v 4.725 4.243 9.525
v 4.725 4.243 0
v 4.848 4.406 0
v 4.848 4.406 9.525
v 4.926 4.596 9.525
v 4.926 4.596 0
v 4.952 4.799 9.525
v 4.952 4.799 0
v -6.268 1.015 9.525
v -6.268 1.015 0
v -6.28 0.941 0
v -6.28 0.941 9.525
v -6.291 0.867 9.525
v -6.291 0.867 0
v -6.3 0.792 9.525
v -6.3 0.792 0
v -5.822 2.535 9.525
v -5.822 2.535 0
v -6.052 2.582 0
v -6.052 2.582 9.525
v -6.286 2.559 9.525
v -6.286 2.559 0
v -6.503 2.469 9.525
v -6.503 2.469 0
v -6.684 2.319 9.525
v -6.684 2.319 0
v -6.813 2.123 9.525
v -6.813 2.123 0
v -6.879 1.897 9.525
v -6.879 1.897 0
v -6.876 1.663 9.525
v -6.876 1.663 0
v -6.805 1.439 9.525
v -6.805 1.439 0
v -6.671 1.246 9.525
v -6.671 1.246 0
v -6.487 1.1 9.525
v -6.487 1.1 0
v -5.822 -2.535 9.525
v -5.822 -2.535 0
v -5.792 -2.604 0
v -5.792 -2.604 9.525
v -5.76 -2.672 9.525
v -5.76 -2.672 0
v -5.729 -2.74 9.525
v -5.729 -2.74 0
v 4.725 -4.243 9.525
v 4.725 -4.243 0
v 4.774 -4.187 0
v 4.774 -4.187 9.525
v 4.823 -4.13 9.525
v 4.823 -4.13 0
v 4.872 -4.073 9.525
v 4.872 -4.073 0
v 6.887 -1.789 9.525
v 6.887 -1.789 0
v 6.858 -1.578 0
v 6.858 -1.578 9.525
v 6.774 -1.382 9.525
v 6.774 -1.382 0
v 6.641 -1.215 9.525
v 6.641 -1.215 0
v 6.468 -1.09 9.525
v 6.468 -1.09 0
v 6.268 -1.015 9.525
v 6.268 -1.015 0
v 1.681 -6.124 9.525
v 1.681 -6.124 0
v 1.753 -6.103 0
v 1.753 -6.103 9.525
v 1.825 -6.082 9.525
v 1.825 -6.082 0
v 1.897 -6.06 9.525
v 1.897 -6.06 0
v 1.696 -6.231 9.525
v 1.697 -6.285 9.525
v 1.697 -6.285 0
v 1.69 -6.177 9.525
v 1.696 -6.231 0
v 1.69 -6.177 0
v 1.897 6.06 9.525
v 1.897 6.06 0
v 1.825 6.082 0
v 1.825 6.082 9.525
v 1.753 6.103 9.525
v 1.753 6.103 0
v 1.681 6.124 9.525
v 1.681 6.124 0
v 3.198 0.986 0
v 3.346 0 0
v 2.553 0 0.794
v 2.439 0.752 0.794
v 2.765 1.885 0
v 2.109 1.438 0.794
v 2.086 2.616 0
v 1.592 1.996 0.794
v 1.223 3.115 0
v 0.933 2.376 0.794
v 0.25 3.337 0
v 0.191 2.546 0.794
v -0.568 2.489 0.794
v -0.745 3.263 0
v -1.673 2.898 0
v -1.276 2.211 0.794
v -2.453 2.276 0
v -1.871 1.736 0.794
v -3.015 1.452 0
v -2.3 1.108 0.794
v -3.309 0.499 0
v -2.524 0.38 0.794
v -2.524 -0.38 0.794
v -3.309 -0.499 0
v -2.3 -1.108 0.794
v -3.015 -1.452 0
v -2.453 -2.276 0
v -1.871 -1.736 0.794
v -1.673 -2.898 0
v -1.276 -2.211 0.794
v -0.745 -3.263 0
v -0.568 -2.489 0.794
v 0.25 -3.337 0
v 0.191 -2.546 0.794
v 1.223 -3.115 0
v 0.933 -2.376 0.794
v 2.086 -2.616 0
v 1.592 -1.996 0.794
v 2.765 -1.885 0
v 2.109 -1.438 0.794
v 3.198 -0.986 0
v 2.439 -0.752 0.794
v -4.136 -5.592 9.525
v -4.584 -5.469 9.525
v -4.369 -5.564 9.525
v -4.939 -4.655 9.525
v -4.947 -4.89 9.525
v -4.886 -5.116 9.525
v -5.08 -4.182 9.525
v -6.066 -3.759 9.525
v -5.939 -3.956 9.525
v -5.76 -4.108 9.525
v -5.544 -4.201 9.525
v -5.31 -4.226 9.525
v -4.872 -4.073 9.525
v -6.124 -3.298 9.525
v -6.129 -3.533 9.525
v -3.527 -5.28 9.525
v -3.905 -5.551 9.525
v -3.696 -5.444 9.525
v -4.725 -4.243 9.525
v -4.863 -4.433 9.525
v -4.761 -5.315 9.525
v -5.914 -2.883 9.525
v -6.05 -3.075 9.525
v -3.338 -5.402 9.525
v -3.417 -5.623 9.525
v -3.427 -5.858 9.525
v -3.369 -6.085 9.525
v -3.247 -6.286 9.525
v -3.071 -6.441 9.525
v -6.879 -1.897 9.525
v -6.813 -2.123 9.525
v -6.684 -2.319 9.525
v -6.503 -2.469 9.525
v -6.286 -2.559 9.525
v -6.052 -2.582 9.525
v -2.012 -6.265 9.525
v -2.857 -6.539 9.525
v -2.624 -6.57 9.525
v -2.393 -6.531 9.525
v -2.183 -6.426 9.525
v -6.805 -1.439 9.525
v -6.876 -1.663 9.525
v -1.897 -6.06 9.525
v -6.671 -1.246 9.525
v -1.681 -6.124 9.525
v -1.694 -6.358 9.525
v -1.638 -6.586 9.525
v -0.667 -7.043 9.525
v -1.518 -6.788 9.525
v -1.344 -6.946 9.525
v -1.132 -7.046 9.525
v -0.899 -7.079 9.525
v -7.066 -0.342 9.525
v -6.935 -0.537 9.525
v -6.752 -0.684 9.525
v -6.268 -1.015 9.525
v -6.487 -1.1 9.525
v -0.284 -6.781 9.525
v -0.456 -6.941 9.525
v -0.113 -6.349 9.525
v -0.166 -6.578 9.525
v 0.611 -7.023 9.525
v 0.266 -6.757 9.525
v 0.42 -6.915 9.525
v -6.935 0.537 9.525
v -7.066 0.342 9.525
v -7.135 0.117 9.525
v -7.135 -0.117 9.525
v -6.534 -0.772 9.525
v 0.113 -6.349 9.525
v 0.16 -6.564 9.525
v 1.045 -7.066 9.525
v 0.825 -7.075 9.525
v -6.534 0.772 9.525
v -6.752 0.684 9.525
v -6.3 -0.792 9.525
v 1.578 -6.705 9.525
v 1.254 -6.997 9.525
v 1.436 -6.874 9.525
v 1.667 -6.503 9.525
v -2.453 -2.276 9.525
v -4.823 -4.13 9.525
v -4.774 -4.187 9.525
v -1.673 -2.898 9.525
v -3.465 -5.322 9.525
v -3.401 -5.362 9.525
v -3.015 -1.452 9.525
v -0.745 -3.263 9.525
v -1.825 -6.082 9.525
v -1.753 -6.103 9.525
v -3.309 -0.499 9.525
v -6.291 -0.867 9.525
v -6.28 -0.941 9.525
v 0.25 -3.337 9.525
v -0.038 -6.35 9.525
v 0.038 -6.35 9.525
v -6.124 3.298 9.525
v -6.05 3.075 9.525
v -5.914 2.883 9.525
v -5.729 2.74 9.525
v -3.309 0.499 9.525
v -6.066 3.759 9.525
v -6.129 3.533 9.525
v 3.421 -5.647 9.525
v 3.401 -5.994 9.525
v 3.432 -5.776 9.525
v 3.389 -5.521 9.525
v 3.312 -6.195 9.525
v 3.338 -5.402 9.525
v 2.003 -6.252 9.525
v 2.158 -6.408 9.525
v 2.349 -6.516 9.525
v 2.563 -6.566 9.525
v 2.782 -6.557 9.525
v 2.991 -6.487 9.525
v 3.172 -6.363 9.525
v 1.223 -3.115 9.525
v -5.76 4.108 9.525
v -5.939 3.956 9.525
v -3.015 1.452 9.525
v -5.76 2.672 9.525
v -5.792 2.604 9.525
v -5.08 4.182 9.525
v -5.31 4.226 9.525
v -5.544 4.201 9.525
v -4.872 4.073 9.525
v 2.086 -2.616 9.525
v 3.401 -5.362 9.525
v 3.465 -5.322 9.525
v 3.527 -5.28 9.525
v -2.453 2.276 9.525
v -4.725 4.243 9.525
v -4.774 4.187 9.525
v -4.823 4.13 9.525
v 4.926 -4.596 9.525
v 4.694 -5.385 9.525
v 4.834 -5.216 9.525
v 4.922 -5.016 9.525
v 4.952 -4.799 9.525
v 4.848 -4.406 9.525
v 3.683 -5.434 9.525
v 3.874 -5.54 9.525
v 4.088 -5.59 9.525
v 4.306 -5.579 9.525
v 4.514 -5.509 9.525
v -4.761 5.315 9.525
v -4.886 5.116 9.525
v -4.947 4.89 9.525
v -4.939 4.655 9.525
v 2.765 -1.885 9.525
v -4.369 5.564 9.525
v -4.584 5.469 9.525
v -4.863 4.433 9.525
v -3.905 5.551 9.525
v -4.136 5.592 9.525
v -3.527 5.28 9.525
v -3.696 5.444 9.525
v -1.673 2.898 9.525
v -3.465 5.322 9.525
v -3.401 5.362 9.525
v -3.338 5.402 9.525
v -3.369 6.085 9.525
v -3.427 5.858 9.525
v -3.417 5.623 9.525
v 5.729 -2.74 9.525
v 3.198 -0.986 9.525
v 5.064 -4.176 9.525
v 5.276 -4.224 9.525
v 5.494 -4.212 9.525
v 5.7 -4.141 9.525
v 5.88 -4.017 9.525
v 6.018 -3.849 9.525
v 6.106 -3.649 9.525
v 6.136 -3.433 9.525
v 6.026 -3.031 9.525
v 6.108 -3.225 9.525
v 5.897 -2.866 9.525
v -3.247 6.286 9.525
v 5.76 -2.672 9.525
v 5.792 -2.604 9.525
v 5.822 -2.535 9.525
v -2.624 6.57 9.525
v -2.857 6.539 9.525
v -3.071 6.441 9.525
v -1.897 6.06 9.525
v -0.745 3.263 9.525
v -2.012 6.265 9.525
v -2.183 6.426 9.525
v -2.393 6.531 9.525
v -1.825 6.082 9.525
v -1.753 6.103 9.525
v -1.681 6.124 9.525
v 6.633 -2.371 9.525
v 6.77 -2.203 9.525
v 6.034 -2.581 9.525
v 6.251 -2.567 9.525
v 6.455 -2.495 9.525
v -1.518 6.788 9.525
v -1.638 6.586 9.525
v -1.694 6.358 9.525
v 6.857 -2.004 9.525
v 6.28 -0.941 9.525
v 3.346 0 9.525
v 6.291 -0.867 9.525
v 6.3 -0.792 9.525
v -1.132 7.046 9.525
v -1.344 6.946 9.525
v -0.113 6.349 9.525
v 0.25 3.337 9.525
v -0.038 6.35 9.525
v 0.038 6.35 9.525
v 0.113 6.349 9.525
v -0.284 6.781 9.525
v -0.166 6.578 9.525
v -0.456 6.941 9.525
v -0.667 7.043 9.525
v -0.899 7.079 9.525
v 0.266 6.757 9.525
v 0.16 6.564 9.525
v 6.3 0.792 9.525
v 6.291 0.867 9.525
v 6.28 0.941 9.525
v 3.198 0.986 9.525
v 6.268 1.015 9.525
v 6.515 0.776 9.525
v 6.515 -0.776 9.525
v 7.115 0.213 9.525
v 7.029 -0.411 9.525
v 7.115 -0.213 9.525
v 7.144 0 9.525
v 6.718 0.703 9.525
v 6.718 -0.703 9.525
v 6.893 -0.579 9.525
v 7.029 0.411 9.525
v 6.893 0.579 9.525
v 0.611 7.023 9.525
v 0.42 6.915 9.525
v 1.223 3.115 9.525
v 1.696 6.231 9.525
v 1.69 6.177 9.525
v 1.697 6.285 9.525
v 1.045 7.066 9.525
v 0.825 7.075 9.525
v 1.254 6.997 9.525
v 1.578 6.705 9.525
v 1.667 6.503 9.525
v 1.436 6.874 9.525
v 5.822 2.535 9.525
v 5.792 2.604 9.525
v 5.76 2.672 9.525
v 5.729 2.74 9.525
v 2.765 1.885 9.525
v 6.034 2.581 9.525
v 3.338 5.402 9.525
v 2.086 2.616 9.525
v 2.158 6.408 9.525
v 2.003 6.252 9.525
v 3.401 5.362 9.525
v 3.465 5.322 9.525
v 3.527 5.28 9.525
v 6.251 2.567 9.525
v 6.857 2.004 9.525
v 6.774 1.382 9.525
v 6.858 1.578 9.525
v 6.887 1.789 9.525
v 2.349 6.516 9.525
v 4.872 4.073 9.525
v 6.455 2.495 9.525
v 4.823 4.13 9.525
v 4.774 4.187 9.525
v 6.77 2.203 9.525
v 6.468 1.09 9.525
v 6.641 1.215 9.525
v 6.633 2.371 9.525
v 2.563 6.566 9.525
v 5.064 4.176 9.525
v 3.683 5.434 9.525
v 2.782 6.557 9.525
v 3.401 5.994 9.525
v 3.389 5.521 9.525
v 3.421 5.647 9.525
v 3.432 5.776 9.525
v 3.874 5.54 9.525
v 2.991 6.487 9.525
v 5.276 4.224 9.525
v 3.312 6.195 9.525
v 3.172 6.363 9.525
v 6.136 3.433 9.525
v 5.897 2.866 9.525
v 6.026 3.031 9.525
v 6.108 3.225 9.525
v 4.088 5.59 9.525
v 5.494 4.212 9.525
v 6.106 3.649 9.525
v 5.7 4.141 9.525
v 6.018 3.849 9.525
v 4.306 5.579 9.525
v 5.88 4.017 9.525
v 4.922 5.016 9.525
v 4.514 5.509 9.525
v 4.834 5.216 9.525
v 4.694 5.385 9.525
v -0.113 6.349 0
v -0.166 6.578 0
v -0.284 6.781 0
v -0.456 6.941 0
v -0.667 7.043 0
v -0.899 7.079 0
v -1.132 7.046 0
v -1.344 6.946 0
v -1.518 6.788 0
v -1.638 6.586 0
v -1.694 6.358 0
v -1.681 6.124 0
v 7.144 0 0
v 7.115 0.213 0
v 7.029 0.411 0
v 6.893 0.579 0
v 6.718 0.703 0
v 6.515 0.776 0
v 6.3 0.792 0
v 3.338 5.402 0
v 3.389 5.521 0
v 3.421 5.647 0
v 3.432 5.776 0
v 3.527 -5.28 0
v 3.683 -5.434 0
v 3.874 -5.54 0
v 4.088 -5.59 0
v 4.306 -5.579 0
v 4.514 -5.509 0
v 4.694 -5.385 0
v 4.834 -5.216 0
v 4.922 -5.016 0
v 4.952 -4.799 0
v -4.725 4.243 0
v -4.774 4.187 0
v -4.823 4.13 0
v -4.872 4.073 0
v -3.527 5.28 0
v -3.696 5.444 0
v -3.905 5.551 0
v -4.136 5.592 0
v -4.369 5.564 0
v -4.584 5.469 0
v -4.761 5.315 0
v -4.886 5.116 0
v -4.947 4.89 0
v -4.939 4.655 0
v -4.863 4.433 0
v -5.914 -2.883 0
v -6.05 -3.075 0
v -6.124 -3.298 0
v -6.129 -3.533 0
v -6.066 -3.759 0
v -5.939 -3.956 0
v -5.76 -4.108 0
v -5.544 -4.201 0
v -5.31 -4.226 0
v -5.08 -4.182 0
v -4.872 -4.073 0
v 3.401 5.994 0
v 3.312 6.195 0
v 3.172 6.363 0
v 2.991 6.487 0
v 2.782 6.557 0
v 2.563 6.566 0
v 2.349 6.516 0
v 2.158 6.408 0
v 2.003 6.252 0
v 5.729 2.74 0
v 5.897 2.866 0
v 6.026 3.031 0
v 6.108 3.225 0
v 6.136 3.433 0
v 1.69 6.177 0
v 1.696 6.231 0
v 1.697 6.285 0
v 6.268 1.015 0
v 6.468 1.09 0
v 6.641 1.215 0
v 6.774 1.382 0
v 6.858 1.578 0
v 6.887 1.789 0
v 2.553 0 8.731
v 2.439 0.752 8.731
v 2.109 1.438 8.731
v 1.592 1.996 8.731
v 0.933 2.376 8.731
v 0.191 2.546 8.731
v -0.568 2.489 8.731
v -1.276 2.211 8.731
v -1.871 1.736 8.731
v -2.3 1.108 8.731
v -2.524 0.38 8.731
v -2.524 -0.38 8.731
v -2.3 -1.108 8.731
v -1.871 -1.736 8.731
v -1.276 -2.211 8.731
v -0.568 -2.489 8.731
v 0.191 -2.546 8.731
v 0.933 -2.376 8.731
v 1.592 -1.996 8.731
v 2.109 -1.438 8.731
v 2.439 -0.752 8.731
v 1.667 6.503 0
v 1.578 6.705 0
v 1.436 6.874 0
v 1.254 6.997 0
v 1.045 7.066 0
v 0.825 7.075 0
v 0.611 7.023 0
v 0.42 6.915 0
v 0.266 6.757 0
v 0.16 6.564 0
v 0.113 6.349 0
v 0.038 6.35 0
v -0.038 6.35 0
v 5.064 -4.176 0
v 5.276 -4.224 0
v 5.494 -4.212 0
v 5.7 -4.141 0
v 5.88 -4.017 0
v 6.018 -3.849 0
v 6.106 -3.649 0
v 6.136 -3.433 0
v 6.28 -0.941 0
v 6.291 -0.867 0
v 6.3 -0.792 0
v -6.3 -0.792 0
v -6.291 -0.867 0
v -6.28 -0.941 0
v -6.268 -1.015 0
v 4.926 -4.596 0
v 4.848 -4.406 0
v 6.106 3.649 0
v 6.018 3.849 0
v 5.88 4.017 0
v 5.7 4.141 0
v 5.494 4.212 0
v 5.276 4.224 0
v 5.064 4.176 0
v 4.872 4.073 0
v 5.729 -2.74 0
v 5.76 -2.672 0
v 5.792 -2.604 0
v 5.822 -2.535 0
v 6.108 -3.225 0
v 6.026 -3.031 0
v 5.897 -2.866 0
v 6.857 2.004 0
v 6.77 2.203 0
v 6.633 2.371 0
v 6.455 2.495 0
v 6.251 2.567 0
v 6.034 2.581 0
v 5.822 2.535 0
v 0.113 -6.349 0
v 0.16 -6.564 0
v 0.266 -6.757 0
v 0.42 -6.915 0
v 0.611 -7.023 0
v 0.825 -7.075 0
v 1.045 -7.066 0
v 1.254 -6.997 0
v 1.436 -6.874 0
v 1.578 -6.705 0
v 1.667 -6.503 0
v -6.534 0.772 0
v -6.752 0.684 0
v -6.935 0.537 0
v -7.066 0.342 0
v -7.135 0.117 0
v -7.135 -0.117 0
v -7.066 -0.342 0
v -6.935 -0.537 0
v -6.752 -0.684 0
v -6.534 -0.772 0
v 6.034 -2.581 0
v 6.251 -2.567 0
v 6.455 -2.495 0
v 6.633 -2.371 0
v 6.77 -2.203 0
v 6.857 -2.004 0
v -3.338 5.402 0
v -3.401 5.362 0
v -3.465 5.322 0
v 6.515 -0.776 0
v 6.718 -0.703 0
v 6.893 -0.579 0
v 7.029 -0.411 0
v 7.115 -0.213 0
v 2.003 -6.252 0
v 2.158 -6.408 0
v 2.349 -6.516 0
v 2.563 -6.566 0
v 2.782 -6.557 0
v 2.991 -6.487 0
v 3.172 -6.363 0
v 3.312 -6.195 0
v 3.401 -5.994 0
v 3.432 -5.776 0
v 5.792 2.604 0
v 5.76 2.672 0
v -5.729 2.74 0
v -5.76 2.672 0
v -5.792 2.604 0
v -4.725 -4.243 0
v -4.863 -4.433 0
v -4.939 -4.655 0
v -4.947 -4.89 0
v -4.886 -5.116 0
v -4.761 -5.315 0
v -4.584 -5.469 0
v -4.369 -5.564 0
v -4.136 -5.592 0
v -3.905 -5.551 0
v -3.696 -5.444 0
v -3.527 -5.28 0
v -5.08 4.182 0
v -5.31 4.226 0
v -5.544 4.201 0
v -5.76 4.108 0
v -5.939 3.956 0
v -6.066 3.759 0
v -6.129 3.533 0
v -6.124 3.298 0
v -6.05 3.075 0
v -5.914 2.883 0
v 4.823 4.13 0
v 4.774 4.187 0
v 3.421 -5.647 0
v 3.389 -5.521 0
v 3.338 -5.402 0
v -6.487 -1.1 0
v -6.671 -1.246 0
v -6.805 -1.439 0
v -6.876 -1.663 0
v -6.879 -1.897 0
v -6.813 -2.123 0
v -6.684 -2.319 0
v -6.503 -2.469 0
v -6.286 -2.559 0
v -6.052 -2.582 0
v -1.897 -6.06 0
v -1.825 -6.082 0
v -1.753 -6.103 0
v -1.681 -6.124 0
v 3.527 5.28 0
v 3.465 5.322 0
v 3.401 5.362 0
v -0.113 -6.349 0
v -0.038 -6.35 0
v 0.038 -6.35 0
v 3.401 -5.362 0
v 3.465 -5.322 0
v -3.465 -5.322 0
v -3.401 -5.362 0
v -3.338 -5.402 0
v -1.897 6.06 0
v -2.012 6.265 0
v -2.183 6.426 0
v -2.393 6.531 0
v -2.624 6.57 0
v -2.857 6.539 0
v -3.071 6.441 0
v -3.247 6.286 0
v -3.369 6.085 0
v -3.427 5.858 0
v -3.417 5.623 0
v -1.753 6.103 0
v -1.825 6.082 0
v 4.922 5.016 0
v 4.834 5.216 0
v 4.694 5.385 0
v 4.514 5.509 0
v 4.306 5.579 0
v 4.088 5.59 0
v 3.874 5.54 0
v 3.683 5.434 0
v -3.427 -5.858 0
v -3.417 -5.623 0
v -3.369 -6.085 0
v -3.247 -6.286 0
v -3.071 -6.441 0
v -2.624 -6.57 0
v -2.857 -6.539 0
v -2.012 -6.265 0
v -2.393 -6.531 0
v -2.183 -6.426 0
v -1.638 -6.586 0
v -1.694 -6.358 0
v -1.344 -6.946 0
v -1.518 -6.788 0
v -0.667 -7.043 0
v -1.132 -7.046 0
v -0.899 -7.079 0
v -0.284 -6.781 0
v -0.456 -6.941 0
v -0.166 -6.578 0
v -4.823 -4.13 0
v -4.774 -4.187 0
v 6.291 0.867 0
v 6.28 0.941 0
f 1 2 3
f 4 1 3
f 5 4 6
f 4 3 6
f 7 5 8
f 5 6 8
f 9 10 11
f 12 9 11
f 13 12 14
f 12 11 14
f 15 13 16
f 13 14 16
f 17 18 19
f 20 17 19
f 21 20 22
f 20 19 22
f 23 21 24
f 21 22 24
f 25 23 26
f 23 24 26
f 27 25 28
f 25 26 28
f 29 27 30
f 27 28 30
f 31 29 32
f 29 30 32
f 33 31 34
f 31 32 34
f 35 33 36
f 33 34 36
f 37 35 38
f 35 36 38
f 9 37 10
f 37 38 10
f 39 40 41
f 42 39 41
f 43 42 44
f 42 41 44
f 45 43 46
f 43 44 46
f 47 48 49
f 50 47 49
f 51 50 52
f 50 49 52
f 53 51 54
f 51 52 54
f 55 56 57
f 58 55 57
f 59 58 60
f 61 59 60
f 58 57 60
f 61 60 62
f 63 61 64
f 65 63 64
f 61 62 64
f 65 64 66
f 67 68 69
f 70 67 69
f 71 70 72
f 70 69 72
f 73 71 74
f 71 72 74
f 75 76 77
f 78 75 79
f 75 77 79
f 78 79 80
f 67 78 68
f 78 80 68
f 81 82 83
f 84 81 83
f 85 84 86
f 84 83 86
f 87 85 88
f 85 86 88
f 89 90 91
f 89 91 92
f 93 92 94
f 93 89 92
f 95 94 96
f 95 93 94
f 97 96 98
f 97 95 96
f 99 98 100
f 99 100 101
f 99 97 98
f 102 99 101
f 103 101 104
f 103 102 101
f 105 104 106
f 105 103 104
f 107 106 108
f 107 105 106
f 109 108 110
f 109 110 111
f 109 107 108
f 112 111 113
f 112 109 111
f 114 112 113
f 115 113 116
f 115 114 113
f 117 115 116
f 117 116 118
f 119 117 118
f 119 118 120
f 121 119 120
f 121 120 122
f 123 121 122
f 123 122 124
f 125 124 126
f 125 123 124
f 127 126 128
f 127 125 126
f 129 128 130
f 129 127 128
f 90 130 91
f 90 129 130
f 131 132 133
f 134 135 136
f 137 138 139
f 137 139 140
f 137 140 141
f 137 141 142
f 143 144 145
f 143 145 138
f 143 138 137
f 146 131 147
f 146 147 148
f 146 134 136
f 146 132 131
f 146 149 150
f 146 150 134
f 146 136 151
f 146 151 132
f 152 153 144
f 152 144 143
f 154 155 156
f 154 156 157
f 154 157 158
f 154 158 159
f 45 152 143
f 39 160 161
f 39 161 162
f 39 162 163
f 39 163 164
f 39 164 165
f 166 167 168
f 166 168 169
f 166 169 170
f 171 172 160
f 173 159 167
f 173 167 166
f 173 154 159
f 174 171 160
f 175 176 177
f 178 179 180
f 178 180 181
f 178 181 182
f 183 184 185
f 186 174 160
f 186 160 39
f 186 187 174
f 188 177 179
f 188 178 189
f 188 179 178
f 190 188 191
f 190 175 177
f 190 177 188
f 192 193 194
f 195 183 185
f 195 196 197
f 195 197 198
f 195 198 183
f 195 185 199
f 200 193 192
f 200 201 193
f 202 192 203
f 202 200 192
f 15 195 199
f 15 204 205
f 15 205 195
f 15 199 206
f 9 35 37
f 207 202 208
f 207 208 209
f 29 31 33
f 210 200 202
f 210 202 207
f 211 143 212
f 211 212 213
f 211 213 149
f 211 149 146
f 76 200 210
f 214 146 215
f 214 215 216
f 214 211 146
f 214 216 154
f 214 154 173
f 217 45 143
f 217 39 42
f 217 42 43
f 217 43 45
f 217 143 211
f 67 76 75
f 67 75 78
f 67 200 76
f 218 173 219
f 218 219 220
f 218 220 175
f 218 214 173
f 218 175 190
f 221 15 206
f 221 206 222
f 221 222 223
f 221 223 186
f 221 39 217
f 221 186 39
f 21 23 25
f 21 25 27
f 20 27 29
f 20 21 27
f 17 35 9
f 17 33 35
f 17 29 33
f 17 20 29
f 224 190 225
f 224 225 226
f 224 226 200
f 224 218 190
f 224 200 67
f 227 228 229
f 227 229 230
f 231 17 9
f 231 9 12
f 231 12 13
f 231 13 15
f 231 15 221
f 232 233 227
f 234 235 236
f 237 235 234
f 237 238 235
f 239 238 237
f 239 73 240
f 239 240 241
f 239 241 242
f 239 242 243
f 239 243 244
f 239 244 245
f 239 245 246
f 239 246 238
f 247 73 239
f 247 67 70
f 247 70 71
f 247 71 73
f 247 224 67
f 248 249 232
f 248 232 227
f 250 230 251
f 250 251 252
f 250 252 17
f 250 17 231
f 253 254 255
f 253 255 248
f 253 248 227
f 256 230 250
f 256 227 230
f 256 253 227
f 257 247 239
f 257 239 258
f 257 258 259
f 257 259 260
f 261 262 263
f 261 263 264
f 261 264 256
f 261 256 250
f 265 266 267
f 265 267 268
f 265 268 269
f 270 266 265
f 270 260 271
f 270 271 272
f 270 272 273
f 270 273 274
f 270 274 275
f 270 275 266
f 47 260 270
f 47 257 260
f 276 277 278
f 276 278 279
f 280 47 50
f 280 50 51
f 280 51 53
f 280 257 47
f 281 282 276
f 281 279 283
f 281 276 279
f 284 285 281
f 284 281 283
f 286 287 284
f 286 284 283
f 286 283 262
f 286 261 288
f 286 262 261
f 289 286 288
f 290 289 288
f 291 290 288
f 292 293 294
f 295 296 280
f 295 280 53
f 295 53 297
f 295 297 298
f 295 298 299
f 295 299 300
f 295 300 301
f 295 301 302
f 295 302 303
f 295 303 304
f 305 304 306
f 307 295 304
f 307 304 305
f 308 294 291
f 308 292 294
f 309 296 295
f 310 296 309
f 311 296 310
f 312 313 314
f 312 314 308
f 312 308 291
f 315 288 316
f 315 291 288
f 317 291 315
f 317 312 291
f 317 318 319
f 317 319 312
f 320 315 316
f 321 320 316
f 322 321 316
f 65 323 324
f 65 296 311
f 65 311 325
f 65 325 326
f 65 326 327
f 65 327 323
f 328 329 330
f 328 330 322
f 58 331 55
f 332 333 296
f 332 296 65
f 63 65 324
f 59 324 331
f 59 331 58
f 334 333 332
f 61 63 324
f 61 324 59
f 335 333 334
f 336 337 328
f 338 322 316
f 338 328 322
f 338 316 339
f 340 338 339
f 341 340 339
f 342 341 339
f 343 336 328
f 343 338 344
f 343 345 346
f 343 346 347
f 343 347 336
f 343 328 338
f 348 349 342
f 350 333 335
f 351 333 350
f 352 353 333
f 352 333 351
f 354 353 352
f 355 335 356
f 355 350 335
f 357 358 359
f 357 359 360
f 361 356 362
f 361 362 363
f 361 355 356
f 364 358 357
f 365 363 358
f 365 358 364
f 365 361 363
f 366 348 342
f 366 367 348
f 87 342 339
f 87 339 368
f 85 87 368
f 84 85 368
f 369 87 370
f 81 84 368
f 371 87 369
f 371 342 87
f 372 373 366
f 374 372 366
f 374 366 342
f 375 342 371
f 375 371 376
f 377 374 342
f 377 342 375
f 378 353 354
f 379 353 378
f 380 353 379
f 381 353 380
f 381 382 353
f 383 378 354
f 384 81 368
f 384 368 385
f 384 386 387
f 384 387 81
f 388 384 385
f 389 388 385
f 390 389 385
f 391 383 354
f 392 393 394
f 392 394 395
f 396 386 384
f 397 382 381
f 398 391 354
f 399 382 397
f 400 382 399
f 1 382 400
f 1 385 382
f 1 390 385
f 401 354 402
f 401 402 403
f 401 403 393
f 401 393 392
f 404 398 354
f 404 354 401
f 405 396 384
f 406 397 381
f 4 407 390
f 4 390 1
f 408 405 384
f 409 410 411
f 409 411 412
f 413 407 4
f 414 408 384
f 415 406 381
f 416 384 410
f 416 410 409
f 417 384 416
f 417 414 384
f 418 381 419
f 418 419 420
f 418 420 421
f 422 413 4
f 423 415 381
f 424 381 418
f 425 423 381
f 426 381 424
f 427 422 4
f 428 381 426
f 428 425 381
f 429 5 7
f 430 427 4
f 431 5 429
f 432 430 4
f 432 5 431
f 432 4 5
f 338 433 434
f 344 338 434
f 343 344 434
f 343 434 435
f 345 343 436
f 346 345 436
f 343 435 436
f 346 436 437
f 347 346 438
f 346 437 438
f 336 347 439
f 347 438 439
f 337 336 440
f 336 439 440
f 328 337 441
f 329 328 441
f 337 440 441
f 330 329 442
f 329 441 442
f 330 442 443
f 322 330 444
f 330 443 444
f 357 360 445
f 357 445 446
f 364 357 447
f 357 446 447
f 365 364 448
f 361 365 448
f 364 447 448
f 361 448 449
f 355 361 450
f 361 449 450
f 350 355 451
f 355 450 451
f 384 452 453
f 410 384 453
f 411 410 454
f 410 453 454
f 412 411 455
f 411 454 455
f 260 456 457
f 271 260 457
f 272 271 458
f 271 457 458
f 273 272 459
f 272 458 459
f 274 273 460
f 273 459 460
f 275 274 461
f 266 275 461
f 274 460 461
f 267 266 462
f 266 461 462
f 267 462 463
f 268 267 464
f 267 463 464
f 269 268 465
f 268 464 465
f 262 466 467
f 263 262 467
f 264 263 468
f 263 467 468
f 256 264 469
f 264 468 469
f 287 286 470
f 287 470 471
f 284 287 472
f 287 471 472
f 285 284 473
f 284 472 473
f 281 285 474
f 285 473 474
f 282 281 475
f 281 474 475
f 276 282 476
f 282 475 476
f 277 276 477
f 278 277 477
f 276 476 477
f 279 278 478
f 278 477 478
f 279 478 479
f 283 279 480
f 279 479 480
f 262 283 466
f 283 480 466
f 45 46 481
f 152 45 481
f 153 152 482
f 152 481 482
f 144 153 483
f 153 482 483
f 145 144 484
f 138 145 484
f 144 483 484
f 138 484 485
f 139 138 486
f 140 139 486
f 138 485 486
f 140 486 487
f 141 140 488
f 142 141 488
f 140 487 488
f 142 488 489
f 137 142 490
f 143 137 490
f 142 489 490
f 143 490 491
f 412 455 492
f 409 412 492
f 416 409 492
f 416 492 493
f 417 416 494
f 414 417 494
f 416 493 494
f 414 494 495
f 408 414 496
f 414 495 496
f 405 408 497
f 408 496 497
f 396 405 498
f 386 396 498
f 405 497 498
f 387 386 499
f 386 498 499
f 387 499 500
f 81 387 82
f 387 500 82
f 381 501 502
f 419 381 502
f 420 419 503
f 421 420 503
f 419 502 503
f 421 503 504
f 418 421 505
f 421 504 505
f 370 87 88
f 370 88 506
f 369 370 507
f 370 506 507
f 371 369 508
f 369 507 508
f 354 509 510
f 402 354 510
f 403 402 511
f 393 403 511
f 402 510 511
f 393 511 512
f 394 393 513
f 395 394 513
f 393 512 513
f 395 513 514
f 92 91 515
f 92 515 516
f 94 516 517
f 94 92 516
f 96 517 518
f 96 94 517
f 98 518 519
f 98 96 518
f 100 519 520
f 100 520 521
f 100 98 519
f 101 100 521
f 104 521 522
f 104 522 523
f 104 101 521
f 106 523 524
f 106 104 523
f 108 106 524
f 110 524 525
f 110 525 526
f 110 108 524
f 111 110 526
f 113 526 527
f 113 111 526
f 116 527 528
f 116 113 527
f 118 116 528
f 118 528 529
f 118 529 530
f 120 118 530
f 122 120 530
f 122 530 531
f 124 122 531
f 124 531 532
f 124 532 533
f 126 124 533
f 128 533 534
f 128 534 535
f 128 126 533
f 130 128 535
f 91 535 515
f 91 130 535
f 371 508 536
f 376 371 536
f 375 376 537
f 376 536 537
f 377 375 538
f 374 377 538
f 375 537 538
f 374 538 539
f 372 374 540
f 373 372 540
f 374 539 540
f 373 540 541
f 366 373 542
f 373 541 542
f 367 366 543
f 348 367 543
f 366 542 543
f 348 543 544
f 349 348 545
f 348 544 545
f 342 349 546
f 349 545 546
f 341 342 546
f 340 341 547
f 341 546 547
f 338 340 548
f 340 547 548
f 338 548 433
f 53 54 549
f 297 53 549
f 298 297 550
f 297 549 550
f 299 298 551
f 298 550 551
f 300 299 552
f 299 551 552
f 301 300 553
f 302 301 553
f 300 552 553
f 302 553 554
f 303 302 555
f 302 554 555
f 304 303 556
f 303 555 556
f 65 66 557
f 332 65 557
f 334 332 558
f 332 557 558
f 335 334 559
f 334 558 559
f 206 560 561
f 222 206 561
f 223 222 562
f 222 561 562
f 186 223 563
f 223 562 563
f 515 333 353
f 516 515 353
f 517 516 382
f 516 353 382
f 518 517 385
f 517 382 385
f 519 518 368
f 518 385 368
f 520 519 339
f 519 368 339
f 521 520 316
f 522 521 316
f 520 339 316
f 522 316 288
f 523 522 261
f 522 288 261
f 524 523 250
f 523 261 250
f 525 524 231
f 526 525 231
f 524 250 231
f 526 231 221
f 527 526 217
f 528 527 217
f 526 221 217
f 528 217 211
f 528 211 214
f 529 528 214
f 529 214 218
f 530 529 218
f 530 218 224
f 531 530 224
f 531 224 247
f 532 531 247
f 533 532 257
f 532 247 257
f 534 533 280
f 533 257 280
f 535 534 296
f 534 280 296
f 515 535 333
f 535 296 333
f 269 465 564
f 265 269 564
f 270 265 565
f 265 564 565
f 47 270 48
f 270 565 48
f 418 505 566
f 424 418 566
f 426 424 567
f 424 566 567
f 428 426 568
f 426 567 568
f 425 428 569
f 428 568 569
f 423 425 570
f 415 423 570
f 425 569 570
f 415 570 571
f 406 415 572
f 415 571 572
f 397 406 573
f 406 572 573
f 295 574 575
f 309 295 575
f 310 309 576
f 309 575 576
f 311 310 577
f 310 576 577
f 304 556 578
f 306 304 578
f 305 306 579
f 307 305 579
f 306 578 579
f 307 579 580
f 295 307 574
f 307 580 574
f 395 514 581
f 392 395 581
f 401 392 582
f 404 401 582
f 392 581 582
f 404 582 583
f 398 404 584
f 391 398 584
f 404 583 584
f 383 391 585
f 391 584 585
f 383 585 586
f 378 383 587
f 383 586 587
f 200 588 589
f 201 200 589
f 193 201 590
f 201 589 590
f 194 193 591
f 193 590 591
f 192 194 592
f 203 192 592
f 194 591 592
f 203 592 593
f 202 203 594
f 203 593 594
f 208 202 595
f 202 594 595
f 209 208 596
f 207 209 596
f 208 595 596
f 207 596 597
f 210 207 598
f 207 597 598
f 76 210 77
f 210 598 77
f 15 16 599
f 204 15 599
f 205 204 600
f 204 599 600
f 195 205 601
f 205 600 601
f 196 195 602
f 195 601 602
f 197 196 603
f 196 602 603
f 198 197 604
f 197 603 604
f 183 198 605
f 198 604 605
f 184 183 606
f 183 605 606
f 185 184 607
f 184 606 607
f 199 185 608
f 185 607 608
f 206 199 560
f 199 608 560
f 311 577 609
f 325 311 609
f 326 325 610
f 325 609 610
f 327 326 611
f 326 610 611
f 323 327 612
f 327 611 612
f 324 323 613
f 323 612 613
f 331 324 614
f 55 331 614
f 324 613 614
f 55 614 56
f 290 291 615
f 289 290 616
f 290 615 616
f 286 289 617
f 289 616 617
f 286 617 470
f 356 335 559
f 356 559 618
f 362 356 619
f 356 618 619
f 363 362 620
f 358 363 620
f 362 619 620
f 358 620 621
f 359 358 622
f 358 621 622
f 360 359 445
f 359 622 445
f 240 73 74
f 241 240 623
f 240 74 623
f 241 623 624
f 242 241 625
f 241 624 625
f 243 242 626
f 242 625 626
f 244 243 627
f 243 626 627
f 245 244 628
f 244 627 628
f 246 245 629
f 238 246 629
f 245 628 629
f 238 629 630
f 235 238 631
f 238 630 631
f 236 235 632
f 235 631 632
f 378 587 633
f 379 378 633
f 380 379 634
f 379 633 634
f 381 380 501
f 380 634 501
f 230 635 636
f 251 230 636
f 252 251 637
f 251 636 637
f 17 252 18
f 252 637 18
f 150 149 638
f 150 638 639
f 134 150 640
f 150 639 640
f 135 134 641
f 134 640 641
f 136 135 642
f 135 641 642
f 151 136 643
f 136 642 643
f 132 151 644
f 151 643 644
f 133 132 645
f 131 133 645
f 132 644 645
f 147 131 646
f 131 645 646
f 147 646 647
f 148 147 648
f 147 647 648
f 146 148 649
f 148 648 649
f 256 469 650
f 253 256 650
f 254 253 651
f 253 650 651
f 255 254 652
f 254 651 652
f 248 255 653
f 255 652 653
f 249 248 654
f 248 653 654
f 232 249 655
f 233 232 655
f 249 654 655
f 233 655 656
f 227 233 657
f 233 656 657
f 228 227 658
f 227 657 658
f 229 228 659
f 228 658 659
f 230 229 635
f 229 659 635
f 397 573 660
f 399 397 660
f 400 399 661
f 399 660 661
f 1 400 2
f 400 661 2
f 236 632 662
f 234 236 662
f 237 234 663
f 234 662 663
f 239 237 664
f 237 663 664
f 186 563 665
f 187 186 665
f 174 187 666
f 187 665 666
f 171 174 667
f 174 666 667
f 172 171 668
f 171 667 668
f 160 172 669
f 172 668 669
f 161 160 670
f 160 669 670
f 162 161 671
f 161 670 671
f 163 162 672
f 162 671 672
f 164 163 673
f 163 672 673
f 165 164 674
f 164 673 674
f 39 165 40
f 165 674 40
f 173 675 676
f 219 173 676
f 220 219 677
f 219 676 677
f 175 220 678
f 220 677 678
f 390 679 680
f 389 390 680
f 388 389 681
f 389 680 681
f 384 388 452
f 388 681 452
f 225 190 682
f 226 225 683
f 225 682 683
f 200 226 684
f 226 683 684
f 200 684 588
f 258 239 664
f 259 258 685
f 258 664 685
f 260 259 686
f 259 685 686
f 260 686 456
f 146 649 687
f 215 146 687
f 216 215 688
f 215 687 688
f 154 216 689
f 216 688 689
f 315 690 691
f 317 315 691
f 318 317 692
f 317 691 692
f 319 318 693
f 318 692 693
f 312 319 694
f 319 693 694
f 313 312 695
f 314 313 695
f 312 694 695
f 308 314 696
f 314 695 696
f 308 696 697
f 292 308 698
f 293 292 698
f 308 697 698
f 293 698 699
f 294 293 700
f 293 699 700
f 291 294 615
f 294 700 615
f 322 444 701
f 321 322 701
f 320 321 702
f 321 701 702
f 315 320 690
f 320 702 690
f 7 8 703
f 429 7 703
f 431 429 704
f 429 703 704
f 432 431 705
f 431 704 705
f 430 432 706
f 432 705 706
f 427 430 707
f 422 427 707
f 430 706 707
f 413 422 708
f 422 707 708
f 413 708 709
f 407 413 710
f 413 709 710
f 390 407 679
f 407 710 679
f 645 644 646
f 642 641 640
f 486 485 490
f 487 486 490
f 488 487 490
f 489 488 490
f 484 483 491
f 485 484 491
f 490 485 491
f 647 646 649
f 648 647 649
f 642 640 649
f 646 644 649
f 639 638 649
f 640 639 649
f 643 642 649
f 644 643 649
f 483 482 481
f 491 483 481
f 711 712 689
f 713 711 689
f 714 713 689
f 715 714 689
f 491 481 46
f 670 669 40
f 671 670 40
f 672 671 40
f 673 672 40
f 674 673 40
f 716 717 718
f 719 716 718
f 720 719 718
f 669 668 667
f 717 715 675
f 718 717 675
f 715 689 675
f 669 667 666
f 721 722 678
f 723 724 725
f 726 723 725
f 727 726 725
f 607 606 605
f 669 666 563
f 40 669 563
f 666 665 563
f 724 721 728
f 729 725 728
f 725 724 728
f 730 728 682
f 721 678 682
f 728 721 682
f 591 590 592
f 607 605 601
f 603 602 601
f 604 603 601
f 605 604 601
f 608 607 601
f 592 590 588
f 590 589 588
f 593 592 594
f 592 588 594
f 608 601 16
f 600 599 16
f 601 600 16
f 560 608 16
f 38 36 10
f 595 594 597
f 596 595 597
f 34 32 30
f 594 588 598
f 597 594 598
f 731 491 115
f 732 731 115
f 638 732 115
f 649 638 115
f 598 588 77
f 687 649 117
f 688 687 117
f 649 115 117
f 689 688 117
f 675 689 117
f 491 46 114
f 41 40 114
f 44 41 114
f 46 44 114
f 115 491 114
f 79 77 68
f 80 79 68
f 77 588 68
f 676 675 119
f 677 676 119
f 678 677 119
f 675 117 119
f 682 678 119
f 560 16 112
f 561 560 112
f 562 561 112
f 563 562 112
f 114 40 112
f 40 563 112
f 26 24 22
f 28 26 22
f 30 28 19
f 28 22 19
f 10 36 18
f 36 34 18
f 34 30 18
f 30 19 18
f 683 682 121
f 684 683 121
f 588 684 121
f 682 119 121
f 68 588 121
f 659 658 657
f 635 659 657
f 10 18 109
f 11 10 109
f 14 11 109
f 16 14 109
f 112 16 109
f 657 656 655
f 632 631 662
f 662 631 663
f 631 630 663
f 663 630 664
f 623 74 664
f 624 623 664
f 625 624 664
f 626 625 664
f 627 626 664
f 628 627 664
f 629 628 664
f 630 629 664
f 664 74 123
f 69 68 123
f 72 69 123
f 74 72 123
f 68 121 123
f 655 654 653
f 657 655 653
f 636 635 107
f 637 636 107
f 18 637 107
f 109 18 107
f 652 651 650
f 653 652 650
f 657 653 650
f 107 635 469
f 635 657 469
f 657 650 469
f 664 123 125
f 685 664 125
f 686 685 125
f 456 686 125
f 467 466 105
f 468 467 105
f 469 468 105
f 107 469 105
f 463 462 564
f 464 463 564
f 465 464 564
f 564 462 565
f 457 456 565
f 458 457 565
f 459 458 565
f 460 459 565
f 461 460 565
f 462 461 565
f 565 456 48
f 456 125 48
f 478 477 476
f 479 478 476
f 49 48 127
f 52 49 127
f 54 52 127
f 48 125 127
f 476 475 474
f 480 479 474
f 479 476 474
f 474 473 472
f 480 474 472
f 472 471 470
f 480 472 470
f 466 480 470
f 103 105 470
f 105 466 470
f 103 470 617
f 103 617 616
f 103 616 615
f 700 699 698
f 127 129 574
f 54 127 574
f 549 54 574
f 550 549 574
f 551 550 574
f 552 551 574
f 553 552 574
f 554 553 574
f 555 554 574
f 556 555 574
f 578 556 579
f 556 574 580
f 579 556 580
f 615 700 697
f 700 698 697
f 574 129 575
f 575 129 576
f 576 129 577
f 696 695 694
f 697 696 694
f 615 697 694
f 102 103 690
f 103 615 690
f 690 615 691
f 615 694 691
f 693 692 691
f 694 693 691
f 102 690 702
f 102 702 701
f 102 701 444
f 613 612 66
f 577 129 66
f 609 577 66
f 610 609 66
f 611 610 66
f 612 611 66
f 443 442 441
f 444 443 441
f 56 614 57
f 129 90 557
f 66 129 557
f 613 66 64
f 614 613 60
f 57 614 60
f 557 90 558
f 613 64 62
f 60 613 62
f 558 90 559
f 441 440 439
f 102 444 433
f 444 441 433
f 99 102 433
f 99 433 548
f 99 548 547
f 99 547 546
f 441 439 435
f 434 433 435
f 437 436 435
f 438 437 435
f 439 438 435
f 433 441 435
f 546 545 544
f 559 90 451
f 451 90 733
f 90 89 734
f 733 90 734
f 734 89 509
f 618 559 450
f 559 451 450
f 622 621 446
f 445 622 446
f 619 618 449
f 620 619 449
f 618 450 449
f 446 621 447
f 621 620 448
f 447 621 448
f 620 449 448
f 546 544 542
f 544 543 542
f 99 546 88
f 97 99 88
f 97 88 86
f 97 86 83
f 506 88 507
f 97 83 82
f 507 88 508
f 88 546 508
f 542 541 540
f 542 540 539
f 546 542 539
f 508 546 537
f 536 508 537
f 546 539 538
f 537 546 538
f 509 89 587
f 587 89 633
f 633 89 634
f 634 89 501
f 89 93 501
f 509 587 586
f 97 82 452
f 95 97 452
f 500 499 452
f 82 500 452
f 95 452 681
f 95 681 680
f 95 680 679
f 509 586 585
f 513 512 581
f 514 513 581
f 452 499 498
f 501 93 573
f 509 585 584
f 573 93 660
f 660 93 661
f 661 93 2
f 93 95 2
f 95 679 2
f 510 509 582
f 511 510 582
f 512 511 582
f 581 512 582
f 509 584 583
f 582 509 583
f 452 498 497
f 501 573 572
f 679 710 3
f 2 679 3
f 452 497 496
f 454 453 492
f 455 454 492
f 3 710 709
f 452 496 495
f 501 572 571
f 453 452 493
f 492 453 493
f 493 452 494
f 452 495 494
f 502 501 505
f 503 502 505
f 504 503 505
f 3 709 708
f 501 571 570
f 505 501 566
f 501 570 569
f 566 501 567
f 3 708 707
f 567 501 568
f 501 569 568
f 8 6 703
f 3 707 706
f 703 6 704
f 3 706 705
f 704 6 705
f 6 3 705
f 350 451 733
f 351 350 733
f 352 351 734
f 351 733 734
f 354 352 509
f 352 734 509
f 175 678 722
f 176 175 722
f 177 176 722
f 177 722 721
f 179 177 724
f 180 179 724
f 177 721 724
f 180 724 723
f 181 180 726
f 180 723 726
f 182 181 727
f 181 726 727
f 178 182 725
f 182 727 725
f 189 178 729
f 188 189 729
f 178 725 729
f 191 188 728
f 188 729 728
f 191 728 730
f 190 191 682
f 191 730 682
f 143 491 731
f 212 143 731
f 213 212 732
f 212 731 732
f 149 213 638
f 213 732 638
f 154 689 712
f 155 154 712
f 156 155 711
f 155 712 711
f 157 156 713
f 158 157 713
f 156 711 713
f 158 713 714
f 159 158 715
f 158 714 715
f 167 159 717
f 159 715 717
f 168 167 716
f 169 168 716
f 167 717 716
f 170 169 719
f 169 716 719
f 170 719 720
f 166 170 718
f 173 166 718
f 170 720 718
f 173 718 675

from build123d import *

# Parameters (mm, degrees)
F0_R     = 2.5527
F1_DEPTH = 9.525
F2_SIZE  = 0.79375


with BuildPart() as f1:
    # F0 (on Top) → F1 (new body)
    with BuildSketch(Plane.XY):
        with BuildLine():
            ThreePointArc((6.300390625, -0.7921981901), (5.55625, 0), (6.300390625, 0.7921981901))
            ThreePointArc((6.300390625, 0.7921981901), (6.2853661559, 0.903699223), (6.2683685573, 1.0149165628))
            ThreePointArc((6.2683685573, 1.0149165628), (5.3311828346, 1.565376519), (5.8219925141, 2.535133757))
            ThreePointArc((5.8219925141, 2.535133757), (5.7761631705, 2.6378853326), (5.7285205486, 2.7398088117))
            ThreePointArc((5.7285205486, 2.7398088117), (4.6742149418, 3.003935542), (4.8719311944, 4.0726878639))
            ThreePointArc((4.8719311944, 4.0726878639), (4.7990097971, 4.1583656606), (4.7245818738, 4.2427380449))
            ThreePointArc((4.7245818738, 4.2427380449), (3.638569953, 4.1991335725), (3.5271749839, 5.2802970213))
            ThreePointArc((3.5271749839, 5.2802970213), (3.4330691908, 5.3419599335), (3.3378856738, 5.4019458743))
            ThreePointArc((3.3378856738, 5.4019458743), (2.308149666, 5.0541427742), (1.896668033, 6.0601279172))
            ThreePointArc((1.896668033, 6.0601279172), (1.7890017359, 6.0927803825), (1.6807738276, 6.1235201755))
            ThreePointArc((1.6807738276, 6.1235201755), (0.7907368202, 5.4996953865), (0.1125043181, 6.3490032902))
            ThreePointArc((0.1125043181, 6.3490032902), (0, 6.35), (-0.1125043181, 6.3490032902))
            ThreePointArc((-0.1125043181, 6.3490032902), (-0.110588254, 6.3172103601), (-0.109949223, 6.2853661559))
            ThreePointArc((-0.109949223, 6.2853661559), (-0.8223478399, 5.4957960103), (-1.6807738276, 6.1235201755))
            ThreePointArc((-1.6807738276, 6.1235201755), (-1.7890017359, 6.0927803825), (-1.896668033, 6.0601279172))
            ThreePointArc((-1.896668033, 6.0601279172), (-1.8573789924, 5.9205547059), (-1.8441353326, 5.7761631705))
            ThreePointArc((-1.8441353326, 5.7761631705), (-2.4449944416, 5.0062072194), (-3.3378856738, 5.4019458743))
            ThreePointArc((-3.3378856738, 5.4019458743), (-3.4330691908, 5.3419599335), (-3.5271749839, 5.2802970213))
            ThreePointArc((-3.5271749839, 5.2802970213), (-3.4063528076, 5.0530092685), (-3.3646156606, 4.7990097971))
            ThreePointArc((-3.3646156606, 4.7990097971), (-3.857861964, 4.0643421234), (-4.7245818738, 4.2427380449))
            ThreePointArc((-4.7245818738, 4.2427380449), (-4.7990097971, 4.1583656606), (-4.8719311944, 4.0726878639))
            ThreePointArc((-4.8719311944, 4.0726878639), (-4.6337493807, 3.7915059013), (-4.5482099335, 3.4330691908))
            ThreePointArc((-4.5482099335, 3.4330691908), (-4.9399608201, 2.7486455097), (-5.7285205486, 2.7398088117))
            ThreePointArc((-5.7285205486, 2.7398088117), (-5.7761631705, 2.6378853326), (-5.8219925141, 2.535133757))
            ThreePointArc((-5.8219925141, 2.535133757), (-5.4427892544, 2.2445789478), (-5.2990303825, 1.7890017359))
            ThreePointArc((-5.2990303825, 1.7890017359), (-5.5974693949, 1.1687549398), (-6.2683685573, 1.0149165628))
            ThreePointArc((-6.2683685573, 1.0149165628), (-6.2853661559, 0.903699223), (-6.300390625, 0.7921981901))
            ThreePointArc((-6.300390625, 0.7921981901), (-5.7714602417, 0.543443475), (-5.55625, 0))
            ThreePointArc((-5.55625, 0), (-5.7714602417, -0.543443475), (-6.300390625, -0.7921981901))
            ThreePointArc((-6.300390625, -0.7921981901), (-6.2853661559, -0.903699223), (-6.2683685573, -1.0149165628))
            ThreePointArc((-6.2683685573, -1.0149165628), (-5.5974693949, -1.1687549398), (-5.2990303825, -1.7890017359))
            ThreePointArc((-5.2990303825, -1.7890017359), (-5.4427892544, -2.2445789478), (-5.8219925141, -2.535133757))
            ThreePointArc((-5.8219925141, -2.535133757), (-5.7761631705, -2.6378853326), (-5.7285205486, -2.7398088117))
            ThreePointArc((-5.7285205486, -2.7398088117), (-4.9399608201, -2.7486455097), (-4.5482099335, -3.4330691908))
            ThreePointArc((-4.5482099335, -3.4330691908), (-4.6337493807, -3.7915059013), (-4.8719311944, -4.0726878639))
            ThreePointArc((-4.8719311944, -4.0726878639), (-4.7990097971, -4.1583656606), (-4.7245818738, -4.2427380449))
            ThreePointArc((-4.7245818738, -4.2427380449), (-3.857861964, -4.0643421234), (-3.3646156606, -4.7990097971))
            ThreePointArc((-3.3646156606, -4.7990097971), (-3.4063528076, -5.0530092685), (-3.5271749839, -5.2802970213))
            ThreePointArc((-3.5271749839, -5.2802970213), (-3.4330691908, -5.3419599335), (-3.3378856738, -5.4019458743))
            ThreePointArc((-3.3378856738, -5.4019458743), (-2.4449944416, -5.0062072194), (-1.8441353326, -5.7761631705))
            ThreePointArc((-1.8441353326, -5.7761631705), (-1.8573789924, -5.9205547059), (-1.896668033, -6.0601279172))
            ThreePointArc((-1.896668033, -6.0601279172), (-1.7890017359, -6.0927803825), (-1.6807738276, -6.1235201755))
            ThreePointArc((-1.6807738276, -6.1235201755), (-0.8223478399, -5.4957960103), (-0.109949223, -6.2853661559))
            ThreePointArc((-0.109949223, -6.2853661559), (-0.110588254, -6.3172103601), (-0.1125043181, -6.3490032902))
            ThreePointArc((-0.1125043181, -6.3490032902), (0, -6.35), (0.1125043181, -6.3490032902))
            ThreePointArc((0.1125043181, -6.3490032902), (0.7907368202, -5.4996953865), (1.6807738276, -6.1235201755))
            ThreePointArc((1.6807738276, -6.1235201755), (1.7890017359, -6.0927803825), (1.896668033, -6.0601279172))
            ThreePointArc((1.896668033, -6.0601279172), (2.308149666, -5.0541427742), (3.3378856738, -5.4019458743))
            ThreePointArc((3.3378856738, -5.4019458743), (3.4330691908, -5.3419599335), (3.5271749839, -5.2802970213))
            ThreePointArc((3.5271749839, -5.2802970213), (3.638569953, -4.1991335725), (4.7245818738, -4.2427380449))
            ThreePointArc((4.7245818738, -4.2427380449), (4.7990097971, -4.1583656606), (4.8719311944, -4.0726878639))
            ThreePointArc((4.8719311944, -4.0726878639), (4.6742149418, -3.003935542), (5.7285205486, -2.7398088117))
            ThreePointArc((5.7285205486, -2.7398088117), (5.7761631705, -2.6378853326), (5.8219925141, -2.535133757))
            ThreePointArc((5.8219925141, -2.535133757), (5.3311828346, -1.565376519), (6.2683685573, -1.0149165628))
            ThreePointArc((6.2683685573, -1.0149165628), (6.2853661559, -0.903699223), (6.300390625, -0.7921981901))
        make_face()
        Circle(F0_R, mode=Mode.SUBTRACT)
        with BuildLine():
            ThreePointArc((-3.3646156606, 4.7990097971), (-3.4063528076, 5.0530092685), (-3.5271749839, 5.2802970213))
            ThreePointArc((-3.5271749839, 5.2802970213), (-4.1583656606, 4.7990097971), (-4.7245818738, 4.2427380449))
            ThreePointArc((-4.7245818738, 4.2427380449), (-3.857861964, 4.0643421234), (-3.3646156606, 4.7990097971))
        make_face()
        with BuildLine():
            ThreePointArc((-1.8441353326, 5.7761631705), (-1.8573789924, 5.9205547059), (-1.896668033, 6.0601279172))
            ThreePointArc((-1.896668033, 6.0601279172), (-2.6378853326, 5.7761631705), (-3.3378856738, 5.4019458743))
            ThreePointArc((-3.3378856738, 5.4019458743), (-2.4449944416, 5.0062072194), (-1.8441353326, 5.7761631705))
        make_face()
        with BuildLine():
            ThreePointArc((-0.109949223, 6.2853661559), (-0.110588254, 6.3172103601), (-0.1125043181, 6.3490032902))
            ThreePointArc((-0.1125043181, 6.3490032902), (-0.903699223, 6.2853661559), (-1.6807738276, 6.1235201755))
            ThreePointArc((-1.6807738276, 6.1235201755), (-0.8223478399, 5.4957960103), (-0.109949223, 6.2853661559))
        make_face()
        with BuildLine():
            ThreePointArc((0.1125043181, 6.3490032902), (0.7907368202, 5.4996953865), (1.6807738276, 6.1235201755))
            ThreePointArc((1.6807738276, 6.1235201755), (0.903699223, 6.2853661559), (0.1125043181, 6.3490032902))
        make_face()
        with BuildLine():
            ThreePointArc((1.896668033, 6.0601279172), (2.308149666, 5.0541427742), (3.3378856738, 5.4019458743))
            ThreePointArc((3.3378856738, 5.4019458743), (2.6378853326, 5.7761631705), (1.896668033, 6.0601279172))
        make_face()
        with BuildLine():
            ThreePointArc((3.5271749839, 5.2802970213), (3.638569953, 4.1991335725), (4.7245818738, 4.2427380449))
            ThreePointArc((4.7245818738, 4.2427380449), (4.1583656606, 4.7990097971), (3.5271749839, 5.2802970213))
        make_face()
        with BuildLine():
            ThreePointArc((4.8719311944, 4.0726878639), (4.6742149418, 3.003935542), (5.7285205486, 2.7398088117))
            ThreePointArc((5.7285205486, 2.7398088117), (5.3419599335, 3.4330691908), (4.8719311944, 4.0726878639))
        make_face()
        with BuildLine():
            ThreePointArc((5.8219925141, 2.535133757), (5.3311828346, 1.565376519), (6.2683685573, 1.0149165628))
            ThreePointArc((6.2683685573, 1.0149165628), (6.0927803825, 1.7890017359), (5.8219925141, 2.535133757))
        make_face()
        with BuildLine():
            ThreePointArc((6.300390625, -0.7921981901), (6.3375855209, -0.396875), (6.35, 0))
            ThreePointArc((6.35, 0), (6.3375855209, 0.396875), (6.300390625, 0.7921981901))
            ThreePointArc((6.300390625, 0.7921981901), (5.55625, 0), (6.300390625, -0.7921981901))
        make_face()
        with BuildLine():
            ThreePointArc((5.8219925141, -2.535133757), (6.0927803825, -1.7890017359), (6.2683685573, -1.0149165628))
            ThreePointArc((6.2683685573, -1.0149165628), (5.3311828346, -1.565376519), (5.8219925141, -2.535133757))
        make_face()
        with BuildLine():
            ThreePointArc((4.8719311944, -4.0726878639), (5.3419599335, -3.4330691908), (5.7285205486, -2.7398088117))
            ThreePointArc((5.7285205486, -2.7398088117), (4.6742149418, -3.003935542), (4.8719311944, -4.0726878639))
        make_face()
        with BuildLine():
            ThreePointArc((3.5271749839, -5.2802970213), (4.1583656606, -4.7990097971), (4.7245818738, -4.2427380449))
            ThreePointArc((4.7245818738, -4.2427380449), (3.638569953, -4.1991335725), (3.5271749839, -5.2802970213))
        make_face()
        with BuildLine():
            ThreePointArc((1.896668033, -6.0601279172), (2.6378853326, -5.7761631705), (3.3378856738, -5.4019458743))
            ThreePointArc((3.3378856738, -5.4019458743), (2.308149666, -5.0541427742), (1.896668033, -6.0601279172))
        make_face()
        with BuildLine():
            ThreePointArc((0.1125043181, -6.3490032902), (0.903699223, -6.2853661559), (1.6807738276, -6.1235201755))
            ThreePointArc((1.6807738276, -6.1235201755), (0.7907368202, -5.4996953865), (0.1125043181, -6.3490032902))
        make_face()
        with BuildLine():
            ThreePointArc((-1.6807738276, -6.1235201755), (-0.903699223, -6.2853661559), (-0.1125043181, -6.3490032902))
            ThreePointArc((-0.1125043181, -6.3490032902), (-0.110588254, -6.3172103601), (-0.109949223, -6.2853661559))
            ThreePointArc((-0.109949223, -6.2853661559), (-0.8223478399, -5.4957960103), (-1.6807738276, -6.1235201755))
        make_face()
        with BuildLine():
            ThreePointArc((-3.3378856738, -5.4019458743), (-2.6378853326, -5.7761631705), (-1.896668033, -6.0601279172))
            ThreePointArc((-1.896668033, -6.0601279172), (-1.8573789924, -5.9205547059), (-1.8441353326, -5.7761631705))
            ThreePointArc((-1.8441353326, -5.7761631705), (-2.4449944416, -5.0062072194), (-3.3378856738, -5.4019458743))
        make_face()
        with BuildLine():
            ThreePointArc((-4.7245818738, -4.2427380449), (-4.1583656606, -4.7990097971), (-3.5271749839, -5.2802970213))
            ThreePointArc((-3.5271749839, -5.2802970213), (-3.4063528076, -5.0530092685), (-3.3646156606, -4.7990097971))
            ThreePointArc((-3.3646156606, -4.7990097971), (-3.857861964, -4.0643421234), (-4.7245818738, -4.2427380449))
        make_face()
        with BuildLine():
            ThreePointArc((-5.7285205486, -2.7398088117), (-5.3419599335, -3.4330691908), (-4.8719311944, -4.0726878639))
            ThreePointArc((-4.8719311944, -4.0726878639), (-4.6337493807, -3.7915059013), (-4.5482099335, -3.4330691908))
            ThreePointArc((-4.5482099335, -3.4330691908), (-4.9399608201, -2.7486455097), (-5.7285205486, -2.7398088117))
        make_face()
        with BuildLine():
            ThreePointArc((-6.2683685573, -1.0149165628), (-6.0927803825, -1.7890017359), (-5.8219925141, -2.535133757))
            ThreePointArc((-5.8219925141, -2.535133757), (-5.4427892544, -2.2445789478), (-5.2990303825, -1.7890017359))
            ThreePointArc((-5.2990303825, -1.7890017359), (-5.5974693949, -1.1687549398), (-6.2683685573, -1.0149165628))
        make_face()
        with BuildLine():
            ThreePointArc((-5.55625, 0), (-5.7714602417, 0.543443475), (-6.300390625, 0.7921981901))
            ThreePointArc((-6.300390625, 0.7921981901), (-6.35, 0), (-6.300390625, -0.7921981901))
            ThreePointArc((-6.300390625, -0.7921981901), (-5.7714602417, -0.543443475), (-5.55625, 0))
        make_face()
        with BuildLine():
            ThreePointArc((-5.2990303825, 1.7890017359), (-5.4427892544, 2.2445789478), (-5.8219925141, 2.535133757))
            ThreePointArc((-5.8219925141, 2.535133757), (-6.0927803825, 1.7890017359), (-6.2683685573, 1.0149165628))
            ThreePointArc((-6.2683685573, 1.0149165628), (-5.5974693949, 1.1687549398), (-5.2990303825, 1.7890017359))
        make_face()
        with BuildLine():
            ThreePointArc((-4.5482099335, 3.4330691908), (-4.6337493807, 3.7915059013), (-4.8719311944, 4.0726878639))
            ThreePointArc((-4.8719311944, 4.0726878639), (-5.3419599335, 3.4330691908), (-5.7285205486, 2.7398088117))
            ThreePointArc((-5.7285205486, 2.7398088117), (-4.9399608201, 2.7486455097), (-4.5482099335, 3.4330691908))
        make_face()
        with BuildLine():
            ThreePointArc((-1.6807738276, 6.1235201755), (-0.903699223, 6.2853661559), (-0.1125043181, 6.3490032902))
            ThreePointArc((-0.1125043181, 6.3490032902), (-1.0166616259, 7.0710369254), (-1.6807738276, 6.1235201755))
        make_face()
        with BuildLine():
            ThreePointArc((0.1125043181, 6.3490032902), (0.903699223, 6.2853661559), (1.6807738276, 6.1235201755))
            ThreePointArc((1.6807738276, 6.1235201755), (1.6932693687, 6.2040147728), (1.697449223, 6.2853661559))
            ThreePointArc((1.697449223, 6.2853661559), (0.9355434272, 7.078477125), (0.1125043181, 6.3490032902))
        make_face()
        with BuildLine():
            ThreePointArc((1.896668033, 6.0601279172), (2.6378853326, 5.7761631705), (3.3378856738, 5.4019458743))
            ThreePointArc((3.3378856738, 5.4019458743), (3.4078412837, 5.5832722795), (3.4316353326, 5.7761631705))
            ThreePointArc((3.4316353326, 5.7761631705), (2.782276868, 6.5566695106), (1.896668033, 6.0601279172))
        make_face()
        with BuildLine():
            ThreePointArc((3.5271749839, 5.2802970213), (4.1583656606, 4.7990097971), (4.7245818738, 4.2427380449))
            ThreePointArc((4.7245818738, 4.2427380449), (4.8930333343, 4.4985061006), (4.9521156606, 4.7990097971))
            ThreePointArc((4.9521156606, 4.7990097971), (4.4123651319, 5.5510226501), (3.5271749839, 5.2802970213))
        make_face()
        with BuildLine():
            ThreePointArc((4.8719311944, 4.0726878639), (5.3419599335, 3.4330691908), (5.7285205486, 2.7398088117))
            ThreePointArc((5.7285205486, 2.7398088117), (6.0263836147, 3.0310700775), (6.1357099335, 3.4330691908))
            ThreePointArc((6.1357099335, 3.4330691908), (5.700396644, 4.1412797436), (4.8719311944, 4.0726878639))
        make_face()
        with BuildLine():
            ThreePointArc((5.8219925141, 2.535133757), (6.0927803825, 1.7890017359), (6.2683685573, 1.0149165628))
            ThreePointArc((6.2683685573, 1.0149165628), (6.7130271786, 1.2936907484), (6.8865303825, 1.7890017359))
            ThreePointArc((6.8865303825, 1.7890017359), (6.5483575943, 2.438992864), (5.8219925141, 2.535133757))
        make_face()
        with BuildLine():
            ThreePointArc((6.300390625, 0.7921981901), (6.3375855209, 0.396875), (6.35, 0))
            ThreePointArc((6.35, 0), (6.3375855209, -0.396875), (6.300390625, -0.7921981901))
            ThreePointArc((6.300390625, -0.7921981901), (6.893443475, -0.5785397583), (7.14375, 0))
            ThreePointArc((7.14375, 0), (6.893443475, 0.5785397583), (6.300390625, 0.7921981901))
        make_face()
        with BuildLine():
            ThreePointArc((6.8865303825, -1.7890017359), (6.7130271786, -1.2936907484), (6.2683685573, -1.0149165628))
            ThreePointArc((6.2683685573, -1.0149165628), (6.0927803825, -1.7890017359), (5.8219925141, -2.535133757))
            ThreePointArc((5.8219925141, -2.535133757), (6.5483575943, -2.438992864), (6.8865303825, -1.7890017359))
        make_face()
        with BuildLine():
            ThreePointArc((6.1357099335, -3.4330691908), (6.0263836147, -3.0310700775), (5.7285205486, -2.7398088117))
            ThreePointArc((5.7285205486, -2.7398088117), (5.3419599335, -3.4330691908), (4.8719311944, -4.0726878639))
            ThreePointArc((4.8719311944, -4.0726878639), (5.700396644, -4.1412797436), (6.1357099335, -3.4330691908))
        make_face()
        with BuildLine():
            ThreePointArc((4.9521156606, -4.7990097971), (4.8930333343, -4.4985061006), (4.7245818738, -4.2427380449))
            ThreePointArc((4.7245818738, -4.2427380449), (4.1583656606, -4.7990097971), (3.5271749839, -5.2802970213))
            ThreePointArc((3.5271749839, -5.2802970213), (4.4123651319, -5.5510226501), (4.9521156606, -4.7990097971))
        make_face()
        with BuildLine():
            ThreePointArc((3.4316353326, -5.7761631705), (3.4078412837, -5.5832722795), (3.3378856738, -5.4019458743))
            ThreePointArc((3.3378856738, -5.4019458743), (2.6378853326, -5.7761631705), (1.896668033, -6.0601279172))
            ThreePointArc((1.896668033, -6.0601279172), (2.782276868, -6.5566695106), (3.4316353326, -5.7761631705))
        make_face()
        with BuildLine():
            ThreePointArc((1.697449223, -6.2853661559), (1.6932693687, -6.2040147728), (1.6807738276, -6.1235201755))
            ThreePointArc((1.6807738276, -6.1235201755), (0.903699223, -6.2853661559), (0.1125043181, -6.3490032902))
            ThreePointArc((0.1125043181, -6.3490032902), (0.9355434272, -7.078477125), (1.697449223, -6.2853661559))
        make_face()
        with BuildLine():
            ThreePointArc((-1.6807738276, -6.1235201755), (-1.0166616259, -7.0710369254), (-0.1125043181, -6.3490032902))
            ThreePointArc((-0.1125043181, -6.3490032902), (-0.903699223, -6.2853661559), (-1.6807738276, -6.1235201755))
        make_face()
        with BuildLine():
            ThreePointArc((-3.3378856738, -5.4019458743), (-2.9676209991, -6.4981835668), (-1.896668033, -6.0601279172))
            ThreePointArc((-1.896668033, -6.0601279172), (-2.6378853326, -5.7761631705), (-3.3378856738, -5.4019458743))
        make_face()
        with BuildLine():
            ThreePointArc((-4.7245818738, -4.2427380449), (-4.6781613681, -5.3988860218), (-3.5271749839, -5.2802970213))
            ThreePointArc((-3.5271749839, -5.2802970213), (-4.1583656606, -4.7990097971), (-4.7245818738, -4.2427380449))
        make_face()
        with BuildLine():
            ThreePointArc((-5.7285205486, -2.7398088117), (-6.0097049252, -3.8622028397), (-4.8719311944, -4.0726878639))
            ThreePointArc((-4.8719311944, -4.0726878639), (-5.3419599335, -3.4330691908), (-5.7285205486, -2.7398088117))
        make_face()
        with BuildLine():
            ThreePointArc((-6.2683685573, -1.0149165628), (-6.8543779303, -2.0126269529), (-5.8219925141, -2.535133757))
            ThreePointArc((-5.8219925141, -2.535133757), (-6.0927803825, -1.7890017359), (-6.2683685573, -1.0149165628))
        make_face()
        with BuildLine():
            ThreePointArc((-6.300390625, -0.7921981901), (-6.35, 0), (-6.300390625, 0.7921981901))
            ThreePointArc((-6.300390625, 0.7921981901), (-7.14375, 0), (-6.300390625, -0.7921981901))
        make_face()
        with BuildLine():
            ThreePointArc((-6.2683685573, 1.0149165628), (-6.0927803825, 1.7890017359), (-5.8219925141, 2.535133757))
            ThreePointArc((-5.8219925141, 2.535133757), (-6.8543779303, 2.0126269529), (-6.2683685573, 1.0149165628))
        make_face()
        with BuildLine():
            ThreePointArc((-5.7285205486, 2.7398088117), (-5.3419599335, 3.4330691908), (-4.8719311944, 4.0726878639))
            ThreePointArc((-4.8719311944, 4.0726878639), (-6.0097049252, 3.8622028397), (-5.7285205486, 2.7398088117))
        make_face()
        with BuildLine():
            ThreePointArc((-4.7245818738, 4.2427380449), (-4.1583656606, 4.7990097971), (-3.5271749839, 5.2802970213))
            ThreePointArc((-3.5271749839, 5.2802970213), (-4.6781613681, 5.3988860218), (-4.7245818738, 4.2427380449))
        make_face()
        with BuildLine():
            ThreePointArc((-3.3378856738, 5.4019458743), (-2.6378853326, 5.7761631705), (-1.896668033, 6.0601279172))
            ThreePointArc((-1.896668033, 6.0601279172), (-2.9676209991, 6.4981835668), (-3.3378856738, 5.4019458743))
        make_face()
    extrude(amount=F1_DEPTH)

    # F2
    f2_edges = [f1.edges().sort_by_distance(p)[0] for p in [
        (2.5527, 0, 4.7625),
        (-2.5527, 0, 0),
        (-2.5527, 0, 9.525),
    ]]
    chamfer(f2_edges, length=F2_SIZE)


solid = f1.part
